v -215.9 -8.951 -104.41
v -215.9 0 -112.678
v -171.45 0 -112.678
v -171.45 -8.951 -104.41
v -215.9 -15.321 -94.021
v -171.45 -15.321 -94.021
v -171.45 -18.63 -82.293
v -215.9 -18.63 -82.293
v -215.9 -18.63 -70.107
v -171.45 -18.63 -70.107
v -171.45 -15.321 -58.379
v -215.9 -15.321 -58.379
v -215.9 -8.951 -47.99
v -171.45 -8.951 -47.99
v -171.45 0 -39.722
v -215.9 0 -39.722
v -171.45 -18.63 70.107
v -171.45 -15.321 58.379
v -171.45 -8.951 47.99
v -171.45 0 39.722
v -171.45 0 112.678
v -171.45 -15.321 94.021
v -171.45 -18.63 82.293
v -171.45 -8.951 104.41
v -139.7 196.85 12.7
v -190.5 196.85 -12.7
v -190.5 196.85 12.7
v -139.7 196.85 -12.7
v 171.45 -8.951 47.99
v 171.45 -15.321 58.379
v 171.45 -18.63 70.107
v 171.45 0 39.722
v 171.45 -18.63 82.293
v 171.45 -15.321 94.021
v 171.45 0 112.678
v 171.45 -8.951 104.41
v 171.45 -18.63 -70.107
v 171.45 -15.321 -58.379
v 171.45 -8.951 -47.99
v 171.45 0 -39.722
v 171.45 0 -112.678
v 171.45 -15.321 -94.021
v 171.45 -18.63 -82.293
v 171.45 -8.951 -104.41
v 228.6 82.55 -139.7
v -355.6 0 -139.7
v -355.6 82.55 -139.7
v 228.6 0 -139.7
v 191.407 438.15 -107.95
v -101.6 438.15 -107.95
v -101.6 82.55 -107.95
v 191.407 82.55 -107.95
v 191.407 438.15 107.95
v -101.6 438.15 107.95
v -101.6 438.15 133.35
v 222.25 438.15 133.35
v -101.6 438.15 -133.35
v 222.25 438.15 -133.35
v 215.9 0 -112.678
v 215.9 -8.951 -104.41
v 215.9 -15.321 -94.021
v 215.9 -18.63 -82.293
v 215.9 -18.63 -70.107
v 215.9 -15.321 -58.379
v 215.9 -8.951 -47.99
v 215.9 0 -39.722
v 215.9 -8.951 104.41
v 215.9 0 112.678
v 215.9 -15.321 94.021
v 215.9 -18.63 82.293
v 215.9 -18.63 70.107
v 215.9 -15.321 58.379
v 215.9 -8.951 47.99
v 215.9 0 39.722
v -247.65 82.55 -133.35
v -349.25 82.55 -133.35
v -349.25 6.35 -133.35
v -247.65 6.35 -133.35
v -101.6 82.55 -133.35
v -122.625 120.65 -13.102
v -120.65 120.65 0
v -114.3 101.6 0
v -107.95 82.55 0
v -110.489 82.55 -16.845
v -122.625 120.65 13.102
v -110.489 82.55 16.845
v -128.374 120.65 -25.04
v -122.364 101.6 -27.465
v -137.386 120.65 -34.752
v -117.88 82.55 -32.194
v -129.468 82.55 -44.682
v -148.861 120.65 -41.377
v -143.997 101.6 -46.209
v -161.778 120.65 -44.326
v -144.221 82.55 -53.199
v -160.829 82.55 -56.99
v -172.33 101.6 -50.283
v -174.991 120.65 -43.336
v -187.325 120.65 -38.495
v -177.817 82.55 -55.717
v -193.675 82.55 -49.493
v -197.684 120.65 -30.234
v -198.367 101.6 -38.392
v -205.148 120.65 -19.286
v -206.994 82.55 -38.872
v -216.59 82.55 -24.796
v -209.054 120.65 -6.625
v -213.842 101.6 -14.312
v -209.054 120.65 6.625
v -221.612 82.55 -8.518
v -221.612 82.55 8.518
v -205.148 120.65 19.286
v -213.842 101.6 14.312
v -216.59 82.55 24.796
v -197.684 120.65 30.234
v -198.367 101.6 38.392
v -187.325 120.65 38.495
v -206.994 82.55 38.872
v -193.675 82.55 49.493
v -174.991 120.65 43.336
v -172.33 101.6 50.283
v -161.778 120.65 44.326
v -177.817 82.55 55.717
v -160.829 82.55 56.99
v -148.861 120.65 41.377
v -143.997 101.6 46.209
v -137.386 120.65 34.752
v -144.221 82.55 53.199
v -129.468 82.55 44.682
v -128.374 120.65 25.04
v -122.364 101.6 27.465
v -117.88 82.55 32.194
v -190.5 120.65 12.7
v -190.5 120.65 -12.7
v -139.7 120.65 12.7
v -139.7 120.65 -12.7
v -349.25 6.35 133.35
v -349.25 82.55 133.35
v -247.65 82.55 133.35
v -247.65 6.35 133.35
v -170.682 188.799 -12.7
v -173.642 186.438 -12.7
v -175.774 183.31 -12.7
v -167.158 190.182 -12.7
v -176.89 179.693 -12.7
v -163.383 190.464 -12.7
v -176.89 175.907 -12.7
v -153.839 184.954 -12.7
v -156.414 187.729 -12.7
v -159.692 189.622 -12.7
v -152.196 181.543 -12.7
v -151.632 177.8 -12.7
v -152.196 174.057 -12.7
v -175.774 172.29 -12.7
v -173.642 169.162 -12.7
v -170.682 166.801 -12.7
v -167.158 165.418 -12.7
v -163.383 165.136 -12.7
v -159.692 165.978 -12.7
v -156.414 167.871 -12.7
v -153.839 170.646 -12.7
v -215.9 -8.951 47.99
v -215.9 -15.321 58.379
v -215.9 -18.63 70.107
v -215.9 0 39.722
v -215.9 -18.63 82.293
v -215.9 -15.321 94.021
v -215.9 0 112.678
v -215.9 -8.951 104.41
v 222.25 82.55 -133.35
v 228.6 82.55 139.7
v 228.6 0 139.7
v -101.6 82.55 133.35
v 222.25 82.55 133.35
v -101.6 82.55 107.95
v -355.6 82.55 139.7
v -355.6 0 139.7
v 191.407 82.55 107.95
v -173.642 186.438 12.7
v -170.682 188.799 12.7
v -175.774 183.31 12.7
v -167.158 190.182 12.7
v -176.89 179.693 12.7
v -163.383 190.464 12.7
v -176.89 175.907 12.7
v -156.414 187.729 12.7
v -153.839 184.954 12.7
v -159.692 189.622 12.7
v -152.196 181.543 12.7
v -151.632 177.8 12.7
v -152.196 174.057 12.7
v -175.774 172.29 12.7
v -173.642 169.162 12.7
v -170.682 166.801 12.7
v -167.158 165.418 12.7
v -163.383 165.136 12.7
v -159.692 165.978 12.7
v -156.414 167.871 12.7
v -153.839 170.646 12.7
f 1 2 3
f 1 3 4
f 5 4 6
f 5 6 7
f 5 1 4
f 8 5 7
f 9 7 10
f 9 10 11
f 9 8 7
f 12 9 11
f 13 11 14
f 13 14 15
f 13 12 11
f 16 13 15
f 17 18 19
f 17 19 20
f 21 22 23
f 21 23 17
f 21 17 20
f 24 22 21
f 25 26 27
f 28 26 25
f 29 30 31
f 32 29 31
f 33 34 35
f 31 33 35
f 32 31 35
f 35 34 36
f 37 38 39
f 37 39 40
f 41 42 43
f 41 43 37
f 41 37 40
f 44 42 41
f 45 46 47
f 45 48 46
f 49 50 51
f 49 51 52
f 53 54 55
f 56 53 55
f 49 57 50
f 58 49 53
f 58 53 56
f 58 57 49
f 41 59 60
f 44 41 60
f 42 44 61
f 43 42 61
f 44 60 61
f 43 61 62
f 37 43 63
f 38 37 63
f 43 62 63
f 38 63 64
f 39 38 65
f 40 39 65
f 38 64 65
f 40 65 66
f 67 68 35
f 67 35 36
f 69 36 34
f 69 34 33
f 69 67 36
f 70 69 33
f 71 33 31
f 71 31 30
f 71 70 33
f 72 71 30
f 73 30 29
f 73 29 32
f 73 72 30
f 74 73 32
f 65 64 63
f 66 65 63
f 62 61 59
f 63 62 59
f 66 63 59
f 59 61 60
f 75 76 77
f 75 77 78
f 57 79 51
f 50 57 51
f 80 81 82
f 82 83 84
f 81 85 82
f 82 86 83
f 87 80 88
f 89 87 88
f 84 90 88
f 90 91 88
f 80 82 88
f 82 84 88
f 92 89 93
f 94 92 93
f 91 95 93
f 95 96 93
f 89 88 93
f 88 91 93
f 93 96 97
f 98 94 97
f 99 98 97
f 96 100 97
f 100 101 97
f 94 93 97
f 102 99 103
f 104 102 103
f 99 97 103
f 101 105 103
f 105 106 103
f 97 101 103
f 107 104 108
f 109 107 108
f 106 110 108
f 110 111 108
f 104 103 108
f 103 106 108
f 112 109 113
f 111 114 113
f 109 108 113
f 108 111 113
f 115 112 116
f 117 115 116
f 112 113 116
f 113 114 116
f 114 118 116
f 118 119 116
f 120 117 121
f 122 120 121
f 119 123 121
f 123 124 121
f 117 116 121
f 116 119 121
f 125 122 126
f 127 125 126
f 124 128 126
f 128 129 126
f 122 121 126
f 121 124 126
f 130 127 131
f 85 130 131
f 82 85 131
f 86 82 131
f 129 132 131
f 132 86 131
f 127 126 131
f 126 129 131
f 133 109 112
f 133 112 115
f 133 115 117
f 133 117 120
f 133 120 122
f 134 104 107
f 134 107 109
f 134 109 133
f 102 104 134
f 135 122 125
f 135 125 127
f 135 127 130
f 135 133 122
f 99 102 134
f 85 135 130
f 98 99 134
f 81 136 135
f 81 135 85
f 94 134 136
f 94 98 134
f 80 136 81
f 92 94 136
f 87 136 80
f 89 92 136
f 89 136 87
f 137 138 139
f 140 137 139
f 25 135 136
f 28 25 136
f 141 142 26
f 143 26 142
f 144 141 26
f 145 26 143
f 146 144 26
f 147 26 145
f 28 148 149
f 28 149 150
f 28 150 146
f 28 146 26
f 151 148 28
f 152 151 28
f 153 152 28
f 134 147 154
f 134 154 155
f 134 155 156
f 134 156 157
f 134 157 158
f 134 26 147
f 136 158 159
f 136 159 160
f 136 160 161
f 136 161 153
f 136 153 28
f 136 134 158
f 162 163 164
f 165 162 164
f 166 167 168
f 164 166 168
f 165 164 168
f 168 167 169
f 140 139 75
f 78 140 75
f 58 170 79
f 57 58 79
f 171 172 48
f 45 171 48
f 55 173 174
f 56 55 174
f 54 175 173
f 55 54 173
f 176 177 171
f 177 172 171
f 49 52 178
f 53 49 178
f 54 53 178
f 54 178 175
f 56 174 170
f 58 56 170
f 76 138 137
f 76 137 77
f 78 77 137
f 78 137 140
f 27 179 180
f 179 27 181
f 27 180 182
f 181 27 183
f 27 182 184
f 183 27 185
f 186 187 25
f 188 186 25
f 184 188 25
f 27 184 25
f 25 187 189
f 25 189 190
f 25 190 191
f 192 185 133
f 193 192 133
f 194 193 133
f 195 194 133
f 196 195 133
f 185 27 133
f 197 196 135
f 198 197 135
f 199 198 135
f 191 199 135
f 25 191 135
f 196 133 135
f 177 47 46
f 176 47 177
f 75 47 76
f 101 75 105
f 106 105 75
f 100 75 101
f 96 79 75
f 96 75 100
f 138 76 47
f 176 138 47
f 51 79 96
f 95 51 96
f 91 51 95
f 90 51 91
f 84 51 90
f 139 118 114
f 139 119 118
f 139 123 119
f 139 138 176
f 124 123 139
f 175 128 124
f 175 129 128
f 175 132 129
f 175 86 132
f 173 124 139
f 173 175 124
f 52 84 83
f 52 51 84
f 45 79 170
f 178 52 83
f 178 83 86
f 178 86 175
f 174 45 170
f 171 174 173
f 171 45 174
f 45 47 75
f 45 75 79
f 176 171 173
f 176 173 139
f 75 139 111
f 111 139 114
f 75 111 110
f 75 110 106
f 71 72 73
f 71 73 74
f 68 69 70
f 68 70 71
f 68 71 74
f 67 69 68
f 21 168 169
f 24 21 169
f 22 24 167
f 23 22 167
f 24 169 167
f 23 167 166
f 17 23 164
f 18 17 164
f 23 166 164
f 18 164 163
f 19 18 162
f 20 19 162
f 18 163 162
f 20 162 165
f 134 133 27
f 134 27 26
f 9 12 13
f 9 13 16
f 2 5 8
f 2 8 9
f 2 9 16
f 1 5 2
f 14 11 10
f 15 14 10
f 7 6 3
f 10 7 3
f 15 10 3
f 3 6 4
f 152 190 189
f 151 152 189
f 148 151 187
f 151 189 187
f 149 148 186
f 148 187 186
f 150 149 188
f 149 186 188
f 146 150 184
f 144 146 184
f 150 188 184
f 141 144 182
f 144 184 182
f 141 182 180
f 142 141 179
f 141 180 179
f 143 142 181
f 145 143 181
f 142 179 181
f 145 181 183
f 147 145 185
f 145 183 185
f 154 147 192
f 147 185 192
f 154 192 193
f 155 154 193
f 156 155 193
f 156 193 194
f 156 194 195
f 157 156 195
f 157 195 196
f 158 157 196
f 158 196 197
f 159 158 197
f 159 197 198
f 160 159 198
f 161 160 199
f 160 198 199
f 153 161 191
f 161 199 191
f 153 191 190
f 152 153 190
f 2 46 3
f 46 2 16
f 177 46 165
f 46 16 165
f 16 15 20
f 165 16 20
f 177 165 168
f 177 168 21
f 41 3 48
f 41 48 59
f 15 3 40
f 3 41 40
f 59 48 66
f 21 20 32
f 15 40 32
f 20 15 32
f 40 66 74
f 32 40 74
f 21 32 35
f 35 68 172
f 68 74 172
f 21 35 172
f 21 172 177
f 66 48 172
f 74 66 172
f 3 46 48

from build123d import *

# Parameters (mm, degrees)
CHASIS_W                = 457.2
CHASIS_H                = 279.4
BOSS_EXTRUDE1_DEPTH     = 82.55
SKETCH3_W               = 44.45
SKETCH3_H               = 44.45
MIRROR2_COPY_1_SKETCH_W = 44.45
MIRROR2_COPY_1_SKETCH_H = 44.45
BOSS_EXTRUDE2_DEPTH     = 355.6
SKETCH6_R               = 44.45
SKETCH5_R               = 57.15
SKETCH10_W              = 279.4
SKETCH10_H              = 82.55
BOSS_EXTRUDE3_DEPTH     = 127
SKETCH11_W              = 101.6
SKETCH11_H              = 266.7
CUT_EXTRUDE1_DEPTH      = 76.2
SKETCH13_W              = 50.8
SKETCH13_H              = 25.4
BOSS_EXTRUDE5_DEPTH     = 76.2
SKETCH15_R              = 12.7
CUT_EXTRUDE2_DEPTH      = 25.4


with BuildPart() as part:
    # Chasis → Boss-Extrude1 (new body)
    with BuildSketch(Plane(origin=(0, 0, 0), x_dir=(1, 0, 0), z_dir=(0, 1, 0))):
        Rectangle(CHASIS_W, CHASIS_H)
    extrude(amount=BOSS_EXTRUDE1_DEPTH)

    # Sketch3 → Revolve1 (revolve)
    with BuildSketch(Plane(origin=(0, 25.4, 0), x_dir=(-1, 0, 0), z_dir=(0, -1, 0))):
        with Locations((193.675, -98.425)):
            Rectangle(SKETCH3_W, SKETCH3_H)
    revolve1 = revolve(axis=Axis((-215.9, 25.4, 76.2), (1, 0, 0)))

    # Mirror1: Revolve1 across plane
    add(revolve1.mirror(Plane.XY))

    # Mirror2: Revolve1 across plane
    add(revolve1.mirror(Plane(origin=(0, 0, 0), x_dir=(0, 0, 1), z_dir=(1, 0, 0))))

    # Mirror2 copy 1 sketch → Mirror2 copy 1 (revolve)
    with BuildSketch(Plane.XZ.offset(-25.4)):
        with Locations((193.675, -98.425)):
            Rectangle(MIRROR2_COPY_1_SKETCH_W, MIRROR2_COPY_1_SKETCH_H)
    revolve(axis=Axis((215.9, 25.4, -76.2), (-1, 0, 0)))

    # Sketch4 → Boss-Extrude2 (add)
    with BuildSketch(Plane(origin=(0, 82.55, 0), x_dir=(1, 0, 0), z_dir=(0, 1, 0))):
        Polygon((222.25, 133.35), (-101.6, 133.35), (-101.6, 107.95), (191.407142857, 107.95), (191.407142857, -107.95), (-101.6, -107.95), (-101.6, -133.35), (222.25, -133.35), align=None)
    extrude(amount=BOSS_EXTRUDE2_DEPTH)

    # Sketch6 → Loft1 section 0
    with BuildSketch(Plane(origin=(0, 120.65, 0), x_dir=(1, 0, 0), z_dir=(0, 1, 0))):
        with Locations((-165.1, 0)):
            Circle(SKETCH6_R)
    # Sketch5 → Loft1 section 1
    with BuildSketch(Plane(origin=(0, 82.55, 0), x_dir=(1, 0, 0), z_dir=(0, 1, 0))):
        with Locations((-165.1, 0)):
            Circle(SKETCH5_R)
    loft()

    # Sketch10 → Boss-Extrude3 (add)
    with BuildSketch(Plane.ZY.offset(228.6)):
        with Locations((0, 41.275)):
            Rectangle(SKETCH10_W, SKETCH10_H)
    extrude(amount=BOSS_EXTRUDE3_DEPTH)

    # Sketch11 → Cut-Extrude1 (cut)
    with BuildSketch(Plane(origin=(0, 82.55, 0), x_dir=(1, 0, 0), z_dir=(0, 1, 0))):
        with Locations((-298.45, 0)):
            Rectangle(SKETCH11_W, SKETCH11_H)
    extrude(amount=-CUT_EXTRUDE1_DEPTH, mode=Mode.SUBTRACT)

    # Sketch13 → Boss-Extrude5 (add)
    with BuildSketch(Plane(origin=(0, 120.65, 0), x_dir=(1, 0, 0), z_dir=(0, 1, 0))):
        with Locations((-165.1, 0)):
            Rectangle(SKETCH13_W, SKETCH13_H)
    extrude(amount=BOSS_EXTRUDE5_DEPTH)

    # Sketch15 → Cut-Extrude2 (cut)
    with BuildSketch(Plane.XY.offset(12.7)):
        with Locations((-164.332091847, 177.8)):
            Circle(SKETCH15_R)
    extrude(amount=-CUT_EXTRUDE2_DEPTH, mode=Mode.SUBTRACT)


solid = part.part
